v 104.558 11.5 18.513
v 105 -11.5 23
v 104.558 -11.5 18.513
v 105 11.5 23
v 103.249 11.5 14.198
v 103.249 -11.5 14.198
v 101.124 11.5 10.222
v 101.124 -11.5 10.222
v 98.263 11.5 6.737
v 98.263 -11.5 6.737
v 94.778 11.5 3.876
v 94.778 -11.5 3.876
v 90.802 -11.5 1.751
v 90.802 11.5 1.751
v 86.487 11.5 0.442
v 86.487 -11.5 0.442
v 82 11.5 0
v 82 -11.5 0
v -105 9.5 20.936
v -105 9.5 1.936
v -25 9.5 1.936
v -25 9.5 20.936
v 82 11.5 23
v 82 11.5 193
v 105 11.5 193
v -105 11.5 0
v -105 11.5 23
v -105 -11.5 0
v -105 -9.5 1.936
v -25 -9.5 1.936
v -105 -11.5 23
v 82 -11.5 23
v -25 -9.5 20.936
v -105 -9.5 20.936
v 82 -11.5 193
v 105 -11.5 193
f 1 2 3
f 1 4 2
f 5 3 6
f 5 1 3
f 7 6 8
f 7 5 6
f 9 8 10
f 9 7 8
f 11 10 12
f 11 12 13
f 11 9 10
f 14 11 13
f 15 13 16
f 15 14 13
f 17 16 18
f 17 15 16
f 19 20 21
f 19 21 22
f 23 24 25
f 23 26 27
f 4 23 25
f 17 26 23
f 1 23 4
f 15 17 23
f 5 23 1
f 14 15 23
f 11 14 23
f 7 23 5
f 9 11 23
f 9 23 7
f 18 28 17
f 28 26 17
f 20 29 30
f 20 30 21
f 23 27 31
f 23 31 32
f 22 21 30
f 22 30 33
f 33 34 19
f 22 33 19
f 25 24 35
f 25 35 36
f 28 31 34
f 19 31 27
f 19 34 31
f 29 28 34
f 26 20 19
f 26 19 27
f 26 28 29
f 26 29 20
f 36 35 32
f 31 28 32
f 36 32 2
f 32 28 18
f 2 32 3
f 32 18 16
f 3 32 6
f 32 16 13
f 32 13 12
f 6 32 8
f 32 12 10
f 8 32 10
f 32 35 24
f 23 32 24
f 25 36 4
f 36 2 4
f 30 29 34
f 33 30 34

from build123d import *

# Parameters (mm, degrees)
CROQUIS1_W              = 210
CROQUIS1_H              = 23
SALIENTE_EXTRUIR2_DEPTH = 23
REDONDEO4_R             = 23
CROQUIS2_W              = 23
CROQUIS2_H              = 23
SALIENTE_EXTRUIR3_DEPTH = 170
CROQUIS8_W              = 19
CROQUIS8_H              = 19
CORTAR_EXTRUIR2_DEPTH   = 80


with BuildPart() as part:
    # Croquis1 → Saliente-Extruir2 (new body)
    with BuildSketch(Plane.XY):
        Rectangle(CROQUIS1_W, CROQUIS1_H)
    extrude(amount=SALIENTE_EXTRUIR2_DEPTH)

    # Redondeo4
    redondeo4_edges = [part.edges().sort_by_distance(p)[0] for p in [
        (105, 0, 0),
    ]]
    fillet(redondeo4_edges, radius=REDONDEO4_R - 0.0001)  # a hair under: the kernel refuses the full size

    # Croquis2 → Saliente-Extruir3 (add)
    with BuildSketch(Plane.XY.offset(23)):
        with Locations((93.5, 0)):
            Rectangle(CROQUIS2_W, CROQUIS2_H)
    extrude(amount=SALIENTE_EXTRUIR3_DEPTH)

    # Croquis8 → Cortar-Extruir2 (cut)
    with BuildSketch(Plane.ZY.offset(105)):
        with Locations((11.435856313, 0)):
            Rectangle(CROQUIS8_W, CROQUIS8_H)
    extrude(amount=-CORTAR_EXTRUIR2_DEPTH, mode=Mode.SUBTRACT)


solid = part.part
